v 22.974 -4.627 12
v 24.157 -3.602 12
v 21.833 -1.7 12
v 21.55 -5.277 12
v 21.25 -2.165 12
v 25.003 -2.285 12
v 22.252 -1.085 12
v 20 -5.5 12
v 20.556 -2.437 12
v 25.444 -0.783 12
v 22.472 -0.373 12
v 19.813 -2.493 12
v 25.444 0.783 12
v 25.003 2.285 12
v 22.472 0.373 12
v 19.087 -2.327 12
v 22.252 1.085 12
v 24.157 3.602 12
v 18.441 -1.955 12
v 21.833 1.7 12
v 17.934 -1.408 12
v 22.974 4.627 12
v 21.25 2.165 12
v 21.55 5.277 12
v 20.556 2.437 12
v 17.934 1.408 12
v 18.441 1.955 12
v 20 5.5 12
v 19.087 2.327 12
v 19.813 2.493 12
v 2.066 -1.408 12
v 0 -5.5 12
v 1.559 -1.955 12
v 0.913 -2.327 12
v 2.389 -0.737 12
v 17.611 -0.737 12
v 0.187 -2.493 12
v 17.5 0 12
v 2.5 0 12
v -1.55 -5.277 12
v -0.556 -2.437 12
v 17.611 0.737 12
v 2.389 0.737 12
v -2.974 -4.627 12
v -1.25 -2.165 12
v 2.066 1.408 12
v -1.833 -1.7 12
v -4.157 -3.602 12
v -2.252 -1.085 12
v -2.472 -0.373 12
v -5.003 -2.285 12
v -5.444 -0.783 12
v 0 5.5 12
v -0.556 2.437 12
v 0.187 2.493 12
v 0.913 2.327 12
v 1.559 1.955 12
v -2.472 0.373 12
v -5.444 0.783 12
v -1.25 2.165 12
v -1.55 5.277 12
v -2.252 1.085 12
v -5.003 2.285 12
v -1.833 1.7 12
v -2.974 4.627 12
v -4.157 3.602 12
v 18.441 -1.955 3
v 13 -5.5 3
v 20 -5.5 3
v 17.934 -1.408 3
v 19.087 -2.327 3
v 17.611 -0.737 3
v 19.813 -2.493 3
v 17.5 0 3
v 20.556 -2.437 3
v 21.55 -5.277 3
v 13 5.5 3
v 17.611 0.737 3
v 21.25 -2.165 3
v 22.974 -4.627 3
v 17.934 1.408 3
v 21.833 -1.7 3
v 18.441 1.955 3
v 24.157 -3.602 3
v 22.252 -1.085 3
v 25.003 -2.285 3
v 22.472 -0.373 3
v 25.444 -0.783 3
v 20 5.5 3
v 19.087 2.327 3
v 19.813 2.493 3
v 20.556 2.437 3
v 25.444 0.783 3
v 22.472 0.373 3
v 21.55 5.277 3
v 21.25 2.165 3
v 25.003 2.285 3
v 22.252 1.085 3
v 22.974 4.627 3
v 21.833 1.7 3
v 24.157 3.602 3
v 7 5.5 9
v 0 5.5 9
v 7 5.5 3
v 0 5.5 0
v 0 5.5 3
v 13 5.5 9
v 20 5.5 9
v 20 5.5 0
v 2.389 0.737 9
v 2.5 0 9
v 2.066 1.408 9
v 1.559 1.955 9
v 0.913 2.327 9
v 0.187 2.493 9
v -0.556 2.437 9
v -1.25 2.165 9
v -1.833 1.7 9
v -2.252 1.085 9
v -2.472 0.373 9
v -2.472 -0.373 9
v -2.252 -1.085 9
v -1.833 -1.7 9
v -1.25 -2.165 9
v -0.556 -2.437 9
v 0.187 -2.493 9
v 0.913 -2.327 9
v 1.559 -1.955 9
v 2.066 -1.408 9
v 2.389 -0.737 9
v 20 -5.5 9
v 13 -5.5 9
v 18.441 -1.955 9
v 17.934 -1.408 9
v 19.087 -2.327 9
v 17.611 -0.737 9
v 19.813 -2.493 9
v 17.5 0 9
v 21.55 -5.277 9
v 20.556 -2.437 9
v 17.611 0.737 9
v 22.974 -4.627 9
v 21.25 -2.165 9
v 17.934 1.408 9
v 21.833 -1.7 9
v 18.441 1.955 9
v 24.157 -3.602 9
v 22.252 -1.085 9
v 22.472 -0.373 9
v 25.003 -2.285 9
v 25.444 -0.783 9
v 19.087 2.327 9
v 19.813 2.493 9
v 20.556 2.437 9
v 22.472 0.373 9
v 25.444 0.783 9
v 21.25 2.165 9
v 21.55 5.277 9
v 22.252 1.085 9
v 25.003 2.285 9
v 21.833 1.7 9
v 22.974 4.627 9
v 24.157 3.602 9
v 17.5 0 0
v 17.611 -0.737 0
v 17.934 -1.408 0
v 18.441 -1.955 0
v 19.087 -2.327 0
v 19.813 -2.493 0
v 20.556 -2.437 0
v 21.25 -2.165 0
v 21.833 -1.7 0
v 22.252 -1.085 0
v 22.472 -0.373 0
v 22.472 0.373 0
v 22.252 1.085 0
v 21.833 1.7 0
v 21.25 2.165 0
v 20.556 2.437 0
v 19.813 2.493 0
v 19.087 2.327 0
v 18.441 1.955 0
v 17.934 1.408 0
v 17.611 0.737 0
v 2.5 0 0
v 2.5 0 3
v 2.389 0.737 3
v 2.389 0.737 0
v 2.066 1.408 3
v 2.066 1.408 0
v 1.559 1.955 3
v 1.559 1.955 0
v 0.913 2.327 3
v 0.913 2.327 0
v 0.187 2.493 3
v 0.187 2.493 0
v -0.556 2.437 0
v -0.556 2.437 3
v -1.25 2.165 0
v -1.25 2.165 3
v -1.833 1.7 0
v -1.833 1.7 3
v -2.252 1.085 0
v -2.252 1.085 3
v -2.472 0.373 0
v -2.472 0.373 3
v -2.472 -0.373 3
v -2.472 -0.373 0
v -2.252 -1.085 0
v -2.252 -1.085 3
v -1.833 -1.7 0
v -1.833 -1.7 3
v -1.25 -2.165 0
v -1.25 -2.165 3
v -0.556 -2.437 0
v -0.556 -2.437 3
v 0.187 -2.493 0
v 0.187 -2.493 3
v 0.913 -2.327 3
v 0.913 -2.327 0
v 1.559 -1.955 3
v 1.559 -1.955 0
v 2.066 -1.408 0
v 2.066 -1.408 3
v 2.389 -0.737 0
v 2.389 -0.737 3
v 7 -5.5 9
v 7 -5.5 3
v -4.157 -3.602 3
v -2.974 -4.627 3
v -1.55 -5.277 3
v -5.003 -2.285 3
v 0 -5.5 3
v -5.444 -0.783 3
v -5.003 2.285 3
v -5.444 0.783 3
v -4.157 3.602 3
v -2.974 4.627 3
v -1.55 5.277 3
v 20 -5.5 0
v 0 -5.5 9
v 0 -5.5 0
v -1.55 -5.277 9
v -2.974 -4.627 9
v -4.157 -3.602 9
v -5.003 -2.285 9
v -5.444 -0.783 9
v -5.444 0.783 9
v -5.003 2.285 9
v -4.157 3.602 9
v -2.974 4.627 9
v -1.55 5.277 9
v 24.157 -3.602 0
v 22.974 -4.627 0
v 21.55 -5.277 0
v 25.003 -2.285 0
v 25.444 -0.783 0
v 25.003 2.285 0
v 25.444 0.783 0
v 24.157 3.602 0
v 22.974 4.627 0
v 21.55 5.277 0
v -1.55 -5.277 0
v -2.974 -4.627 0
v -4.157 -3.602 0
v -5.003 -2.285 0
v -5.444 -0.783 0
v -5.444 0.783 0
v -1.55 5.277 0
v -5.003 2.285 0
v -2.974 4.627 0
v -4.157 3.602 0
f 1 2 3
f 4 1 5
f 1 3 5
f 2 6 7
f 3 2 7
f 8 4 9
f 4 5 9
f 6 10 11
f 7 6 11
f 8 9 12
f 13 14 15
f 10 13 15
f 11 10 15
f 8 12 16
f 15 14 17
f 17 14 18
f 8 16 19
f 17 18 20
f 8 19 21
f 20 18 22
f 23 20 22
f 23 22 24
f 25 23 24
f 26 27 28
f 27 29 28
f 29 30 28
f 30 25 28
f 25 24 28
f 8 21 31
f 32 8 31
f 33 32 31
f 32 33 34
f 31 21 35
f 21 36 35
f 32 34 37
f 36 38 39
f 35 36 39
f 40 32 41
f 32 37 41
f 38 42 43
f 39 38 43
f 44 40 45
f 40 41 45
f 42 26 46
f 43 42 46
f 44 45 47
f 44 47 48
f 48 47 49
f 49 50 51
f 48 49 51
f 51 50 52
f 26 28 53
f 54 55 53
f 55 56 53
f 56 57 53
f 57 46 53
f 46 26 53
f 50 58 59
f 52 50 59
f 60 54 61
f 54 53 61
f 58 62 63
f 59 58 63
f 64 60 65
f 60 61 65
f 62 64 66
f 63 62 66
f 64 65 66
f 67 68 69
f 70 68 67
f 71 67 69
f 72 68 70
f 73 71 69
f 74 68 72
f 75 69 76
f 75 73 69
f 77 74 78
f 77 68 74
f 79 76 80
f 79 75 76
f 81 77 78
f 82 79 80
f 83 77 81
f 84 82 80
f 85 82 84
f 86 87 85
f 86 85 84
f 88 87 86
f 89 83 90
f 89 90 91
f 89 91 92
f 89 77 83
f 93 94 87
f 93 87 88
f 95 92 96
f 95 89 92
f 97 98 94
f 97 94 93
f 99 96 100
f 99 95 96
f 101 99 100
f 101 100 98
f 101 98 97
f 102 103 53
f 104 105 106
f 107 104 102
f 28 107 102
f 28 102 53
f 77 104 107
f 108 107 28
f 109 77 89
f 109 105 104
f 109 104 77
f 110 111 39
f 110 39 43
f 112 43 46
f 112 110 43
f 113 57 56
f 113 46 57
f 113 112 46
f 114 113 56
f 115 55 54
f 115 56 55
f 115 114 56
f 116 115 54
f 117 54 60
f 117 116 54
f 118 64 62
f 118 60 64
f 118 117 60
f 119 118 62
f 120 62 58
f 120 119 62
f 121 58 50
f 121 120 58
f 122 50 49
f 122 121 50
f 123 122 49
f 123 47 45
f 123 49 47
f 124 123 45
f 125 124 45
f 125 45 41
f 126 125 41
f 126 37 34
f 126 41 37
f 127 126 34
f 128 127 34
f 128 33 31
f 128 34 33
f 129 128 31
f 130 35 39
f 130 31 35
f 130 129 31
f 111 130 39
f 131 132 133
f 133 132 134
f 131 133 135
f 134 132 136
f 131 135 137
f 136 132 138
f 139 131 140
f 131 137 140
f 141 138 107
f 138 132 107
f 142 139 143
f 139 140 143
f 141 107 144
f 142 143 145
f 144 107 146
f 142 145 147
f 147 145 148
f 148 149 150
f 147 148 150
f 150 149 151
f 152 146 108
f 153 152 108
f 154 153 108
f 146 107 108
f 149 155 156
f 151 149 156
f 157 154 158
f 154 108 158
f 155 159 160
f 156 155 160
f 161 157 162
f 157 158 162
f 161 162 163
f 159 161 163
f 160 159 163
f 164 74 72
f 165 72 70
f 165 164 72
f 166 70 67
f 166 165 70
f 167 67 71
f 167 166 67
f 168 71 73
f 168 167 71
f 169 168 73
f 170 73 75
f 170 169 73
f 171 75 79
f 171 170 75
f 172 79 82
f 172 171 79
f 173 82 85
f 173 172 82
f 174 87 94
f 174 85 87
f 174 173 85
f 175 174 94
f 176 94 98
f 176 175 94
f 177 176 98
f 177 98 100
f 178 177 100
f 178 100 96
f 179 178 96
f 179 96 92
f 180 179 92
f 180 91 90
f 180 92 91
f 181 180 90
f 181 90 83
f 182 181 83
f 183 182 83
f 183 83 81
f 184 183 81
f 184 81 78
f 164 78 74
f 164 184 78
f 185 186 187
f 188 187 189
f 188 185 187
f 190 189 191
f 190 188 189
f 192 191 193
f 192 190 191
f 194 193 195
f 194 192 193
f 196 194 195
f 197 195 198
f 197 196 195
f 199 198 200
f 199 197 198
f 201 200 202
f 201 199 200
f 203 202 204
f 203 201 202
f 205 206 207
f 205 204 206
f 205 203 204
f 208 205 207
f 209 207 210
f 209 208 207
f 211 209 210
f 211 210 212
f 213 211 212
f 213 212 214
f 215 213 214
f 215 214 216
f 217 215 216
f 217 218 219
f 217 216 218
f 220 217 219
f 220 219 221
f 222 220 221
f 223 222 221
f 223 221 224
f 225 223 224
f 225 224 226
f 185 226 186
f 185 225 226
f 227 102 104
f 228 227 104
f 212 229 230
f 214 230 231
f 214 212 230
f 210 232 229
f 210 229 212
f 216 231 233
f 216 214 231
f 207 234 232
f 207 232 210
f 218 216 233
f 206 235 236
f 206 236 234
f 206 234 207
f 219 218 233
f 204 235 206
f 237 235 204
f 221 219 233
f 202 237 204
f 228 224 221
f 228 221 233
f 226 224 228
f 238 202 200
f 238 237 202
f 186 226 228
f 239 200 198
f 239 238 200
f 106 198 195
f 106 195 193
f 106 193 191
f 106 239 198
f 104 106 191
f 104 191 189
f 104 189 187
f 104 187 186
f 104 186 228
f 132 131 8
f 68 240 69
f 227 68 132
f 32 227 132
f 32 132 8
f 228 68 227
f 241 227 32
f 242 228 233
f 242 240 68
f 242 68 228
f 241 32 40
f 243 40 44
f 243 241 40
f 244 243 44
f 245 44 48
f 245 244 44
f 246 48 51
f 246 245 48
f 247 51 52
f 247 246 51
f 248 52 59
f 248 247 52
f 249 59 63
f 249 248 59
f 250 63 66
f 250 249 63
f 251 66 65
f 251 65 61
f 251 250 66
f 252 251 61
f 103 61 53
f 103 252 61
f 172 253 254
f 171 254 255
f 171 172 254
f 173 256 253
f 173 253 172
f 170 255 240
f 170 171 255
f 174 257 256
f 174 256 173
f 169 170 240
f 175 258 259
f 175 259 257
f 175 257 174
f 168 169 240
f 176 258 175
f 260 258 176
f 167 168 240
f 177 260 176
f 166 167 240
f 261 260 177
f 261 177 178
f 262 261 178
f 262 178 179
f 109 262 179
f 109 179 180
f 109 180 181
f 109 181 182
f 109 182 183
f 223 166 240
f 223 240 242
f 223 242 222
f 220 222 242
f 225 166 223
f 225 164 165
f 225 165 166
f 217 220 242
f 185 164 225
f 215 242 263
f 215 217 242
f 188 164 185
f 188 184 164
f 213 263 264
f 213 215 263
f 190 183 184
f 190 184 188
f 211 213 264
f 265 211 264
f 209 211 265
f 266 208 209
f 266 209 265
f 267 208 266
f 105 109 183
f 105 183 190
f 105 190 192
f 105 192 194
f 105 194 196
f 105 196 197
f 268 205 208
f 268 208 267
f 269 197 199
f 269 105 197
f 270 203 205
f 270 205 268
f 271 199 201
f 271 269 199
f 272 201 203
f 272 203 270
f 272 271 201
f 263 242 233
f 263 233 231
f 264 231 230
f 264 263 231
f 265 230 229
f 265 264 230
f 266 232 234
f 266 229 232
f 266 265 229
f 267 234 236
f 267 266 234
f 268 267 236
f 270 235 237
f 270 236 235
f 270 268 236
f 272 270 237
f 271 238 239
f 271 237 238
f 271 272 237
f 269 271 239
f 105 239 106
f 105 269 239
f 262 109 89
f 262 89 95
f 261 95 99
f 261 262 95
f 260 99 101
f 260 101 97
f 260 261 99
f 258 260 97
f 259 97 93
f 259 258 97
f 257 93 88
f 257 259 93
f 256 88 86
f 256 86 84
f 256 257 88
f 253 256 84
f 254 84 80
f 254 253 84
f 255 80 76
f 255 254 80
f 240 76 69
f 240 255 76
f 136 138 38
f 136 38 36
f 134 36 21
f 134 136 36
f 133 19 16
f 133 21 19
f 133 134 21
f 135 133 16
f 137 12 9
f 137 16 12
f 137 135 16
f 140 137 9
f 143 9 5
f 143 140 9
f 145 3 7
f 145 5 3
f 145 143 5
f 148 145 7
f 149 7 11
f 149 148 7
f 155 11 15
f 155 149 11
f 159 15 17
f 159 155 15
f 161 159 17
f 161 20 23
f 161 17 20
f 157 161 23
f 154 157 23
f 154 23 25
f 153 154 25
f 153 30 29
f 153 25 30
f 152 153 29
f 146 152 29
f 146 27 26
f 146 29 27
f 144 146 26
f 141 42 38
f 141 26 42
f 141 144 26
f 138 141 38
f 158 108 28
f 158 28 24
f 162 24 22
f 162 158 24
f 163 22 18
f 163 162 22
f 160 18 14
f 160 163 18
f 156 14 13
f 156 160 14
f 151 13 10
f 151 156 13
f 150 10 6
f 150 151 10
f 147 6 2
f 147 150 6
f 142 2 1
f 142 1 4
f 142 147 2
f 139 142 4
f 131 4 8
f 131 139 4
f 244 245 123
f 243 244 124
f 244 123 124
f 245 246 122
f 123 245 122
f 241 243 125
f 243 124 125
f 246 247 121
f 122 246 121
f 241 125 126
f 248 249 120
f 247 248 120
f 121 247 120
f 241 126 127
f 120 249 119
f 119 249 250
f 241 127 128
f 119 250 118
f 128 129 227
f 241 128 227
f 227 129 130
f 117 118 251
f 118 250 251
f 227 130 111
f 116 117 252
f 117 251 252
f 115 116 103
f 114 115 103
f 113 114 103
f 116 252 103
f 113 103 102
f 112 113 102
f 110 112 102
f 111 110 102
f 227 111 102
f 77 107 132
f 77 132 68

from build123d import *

# Parameters (mm, degrees)
BOSS_EXTRUDE1_DEPTH = 12
SKETCH6_W           = 12.5
SKETCH6_H           = 6
CUT_EXTRUDE1_DEPTH  = 31.253099015
SKETCH2_R           = 2.5
CUT_EXTRUDE2_DEPTH  = 29.714108031


with BuildPart() as part:
    # Sketch5 → Boss-Extrude1 (new body)
    with BuildSketch(Plane.XY):
        with BuildLine():
            Line((0, 5.5), (20, 5.5))
            ThreePointArc((20, 5.5), (25.5, 0), (20, -5.5))
            Line((20, -5.5), (0, -5.5))
            ThreePointArc((0, -5.5), (-5.5, 0), (0, 5.5))
        make_face()
    extrude(amount=BOSS_EXTRUDE1_DEPTH)

    # Sketch6 → Cut-Extrude1 (cut, through all)
    with BuildSketch(Plane(origin=(0, 5.5, 0), x_dir=(1, 0, 0), z_dir=(0, 1, 0))):
        with Locations((0.75, -6)):
            Rectangle(SKETCH6_W, SKETCH6_H)
        with Locations((19.25, -6)):
            Rectangle(SKETCH6_W, SKETCH6_H)
    extrude(amount=-CUT_EXTRUDE1_DEPTH, mode=Mode.SUBTRACT)

    # Sketch2 → Cut-Extrude2 (cut, through all)
    with BuildSketch(Plane.XY):
        Circle(SKETCH2_R)
        with Locations(Location((20, 0, 0), (0, 0, 180))):
            Circle(SKETCH2_R)
    extrude(amount=CUT_EXTRUDE2_DEPTH, mode=Mode.SUBTRACT)


solid = part.part
